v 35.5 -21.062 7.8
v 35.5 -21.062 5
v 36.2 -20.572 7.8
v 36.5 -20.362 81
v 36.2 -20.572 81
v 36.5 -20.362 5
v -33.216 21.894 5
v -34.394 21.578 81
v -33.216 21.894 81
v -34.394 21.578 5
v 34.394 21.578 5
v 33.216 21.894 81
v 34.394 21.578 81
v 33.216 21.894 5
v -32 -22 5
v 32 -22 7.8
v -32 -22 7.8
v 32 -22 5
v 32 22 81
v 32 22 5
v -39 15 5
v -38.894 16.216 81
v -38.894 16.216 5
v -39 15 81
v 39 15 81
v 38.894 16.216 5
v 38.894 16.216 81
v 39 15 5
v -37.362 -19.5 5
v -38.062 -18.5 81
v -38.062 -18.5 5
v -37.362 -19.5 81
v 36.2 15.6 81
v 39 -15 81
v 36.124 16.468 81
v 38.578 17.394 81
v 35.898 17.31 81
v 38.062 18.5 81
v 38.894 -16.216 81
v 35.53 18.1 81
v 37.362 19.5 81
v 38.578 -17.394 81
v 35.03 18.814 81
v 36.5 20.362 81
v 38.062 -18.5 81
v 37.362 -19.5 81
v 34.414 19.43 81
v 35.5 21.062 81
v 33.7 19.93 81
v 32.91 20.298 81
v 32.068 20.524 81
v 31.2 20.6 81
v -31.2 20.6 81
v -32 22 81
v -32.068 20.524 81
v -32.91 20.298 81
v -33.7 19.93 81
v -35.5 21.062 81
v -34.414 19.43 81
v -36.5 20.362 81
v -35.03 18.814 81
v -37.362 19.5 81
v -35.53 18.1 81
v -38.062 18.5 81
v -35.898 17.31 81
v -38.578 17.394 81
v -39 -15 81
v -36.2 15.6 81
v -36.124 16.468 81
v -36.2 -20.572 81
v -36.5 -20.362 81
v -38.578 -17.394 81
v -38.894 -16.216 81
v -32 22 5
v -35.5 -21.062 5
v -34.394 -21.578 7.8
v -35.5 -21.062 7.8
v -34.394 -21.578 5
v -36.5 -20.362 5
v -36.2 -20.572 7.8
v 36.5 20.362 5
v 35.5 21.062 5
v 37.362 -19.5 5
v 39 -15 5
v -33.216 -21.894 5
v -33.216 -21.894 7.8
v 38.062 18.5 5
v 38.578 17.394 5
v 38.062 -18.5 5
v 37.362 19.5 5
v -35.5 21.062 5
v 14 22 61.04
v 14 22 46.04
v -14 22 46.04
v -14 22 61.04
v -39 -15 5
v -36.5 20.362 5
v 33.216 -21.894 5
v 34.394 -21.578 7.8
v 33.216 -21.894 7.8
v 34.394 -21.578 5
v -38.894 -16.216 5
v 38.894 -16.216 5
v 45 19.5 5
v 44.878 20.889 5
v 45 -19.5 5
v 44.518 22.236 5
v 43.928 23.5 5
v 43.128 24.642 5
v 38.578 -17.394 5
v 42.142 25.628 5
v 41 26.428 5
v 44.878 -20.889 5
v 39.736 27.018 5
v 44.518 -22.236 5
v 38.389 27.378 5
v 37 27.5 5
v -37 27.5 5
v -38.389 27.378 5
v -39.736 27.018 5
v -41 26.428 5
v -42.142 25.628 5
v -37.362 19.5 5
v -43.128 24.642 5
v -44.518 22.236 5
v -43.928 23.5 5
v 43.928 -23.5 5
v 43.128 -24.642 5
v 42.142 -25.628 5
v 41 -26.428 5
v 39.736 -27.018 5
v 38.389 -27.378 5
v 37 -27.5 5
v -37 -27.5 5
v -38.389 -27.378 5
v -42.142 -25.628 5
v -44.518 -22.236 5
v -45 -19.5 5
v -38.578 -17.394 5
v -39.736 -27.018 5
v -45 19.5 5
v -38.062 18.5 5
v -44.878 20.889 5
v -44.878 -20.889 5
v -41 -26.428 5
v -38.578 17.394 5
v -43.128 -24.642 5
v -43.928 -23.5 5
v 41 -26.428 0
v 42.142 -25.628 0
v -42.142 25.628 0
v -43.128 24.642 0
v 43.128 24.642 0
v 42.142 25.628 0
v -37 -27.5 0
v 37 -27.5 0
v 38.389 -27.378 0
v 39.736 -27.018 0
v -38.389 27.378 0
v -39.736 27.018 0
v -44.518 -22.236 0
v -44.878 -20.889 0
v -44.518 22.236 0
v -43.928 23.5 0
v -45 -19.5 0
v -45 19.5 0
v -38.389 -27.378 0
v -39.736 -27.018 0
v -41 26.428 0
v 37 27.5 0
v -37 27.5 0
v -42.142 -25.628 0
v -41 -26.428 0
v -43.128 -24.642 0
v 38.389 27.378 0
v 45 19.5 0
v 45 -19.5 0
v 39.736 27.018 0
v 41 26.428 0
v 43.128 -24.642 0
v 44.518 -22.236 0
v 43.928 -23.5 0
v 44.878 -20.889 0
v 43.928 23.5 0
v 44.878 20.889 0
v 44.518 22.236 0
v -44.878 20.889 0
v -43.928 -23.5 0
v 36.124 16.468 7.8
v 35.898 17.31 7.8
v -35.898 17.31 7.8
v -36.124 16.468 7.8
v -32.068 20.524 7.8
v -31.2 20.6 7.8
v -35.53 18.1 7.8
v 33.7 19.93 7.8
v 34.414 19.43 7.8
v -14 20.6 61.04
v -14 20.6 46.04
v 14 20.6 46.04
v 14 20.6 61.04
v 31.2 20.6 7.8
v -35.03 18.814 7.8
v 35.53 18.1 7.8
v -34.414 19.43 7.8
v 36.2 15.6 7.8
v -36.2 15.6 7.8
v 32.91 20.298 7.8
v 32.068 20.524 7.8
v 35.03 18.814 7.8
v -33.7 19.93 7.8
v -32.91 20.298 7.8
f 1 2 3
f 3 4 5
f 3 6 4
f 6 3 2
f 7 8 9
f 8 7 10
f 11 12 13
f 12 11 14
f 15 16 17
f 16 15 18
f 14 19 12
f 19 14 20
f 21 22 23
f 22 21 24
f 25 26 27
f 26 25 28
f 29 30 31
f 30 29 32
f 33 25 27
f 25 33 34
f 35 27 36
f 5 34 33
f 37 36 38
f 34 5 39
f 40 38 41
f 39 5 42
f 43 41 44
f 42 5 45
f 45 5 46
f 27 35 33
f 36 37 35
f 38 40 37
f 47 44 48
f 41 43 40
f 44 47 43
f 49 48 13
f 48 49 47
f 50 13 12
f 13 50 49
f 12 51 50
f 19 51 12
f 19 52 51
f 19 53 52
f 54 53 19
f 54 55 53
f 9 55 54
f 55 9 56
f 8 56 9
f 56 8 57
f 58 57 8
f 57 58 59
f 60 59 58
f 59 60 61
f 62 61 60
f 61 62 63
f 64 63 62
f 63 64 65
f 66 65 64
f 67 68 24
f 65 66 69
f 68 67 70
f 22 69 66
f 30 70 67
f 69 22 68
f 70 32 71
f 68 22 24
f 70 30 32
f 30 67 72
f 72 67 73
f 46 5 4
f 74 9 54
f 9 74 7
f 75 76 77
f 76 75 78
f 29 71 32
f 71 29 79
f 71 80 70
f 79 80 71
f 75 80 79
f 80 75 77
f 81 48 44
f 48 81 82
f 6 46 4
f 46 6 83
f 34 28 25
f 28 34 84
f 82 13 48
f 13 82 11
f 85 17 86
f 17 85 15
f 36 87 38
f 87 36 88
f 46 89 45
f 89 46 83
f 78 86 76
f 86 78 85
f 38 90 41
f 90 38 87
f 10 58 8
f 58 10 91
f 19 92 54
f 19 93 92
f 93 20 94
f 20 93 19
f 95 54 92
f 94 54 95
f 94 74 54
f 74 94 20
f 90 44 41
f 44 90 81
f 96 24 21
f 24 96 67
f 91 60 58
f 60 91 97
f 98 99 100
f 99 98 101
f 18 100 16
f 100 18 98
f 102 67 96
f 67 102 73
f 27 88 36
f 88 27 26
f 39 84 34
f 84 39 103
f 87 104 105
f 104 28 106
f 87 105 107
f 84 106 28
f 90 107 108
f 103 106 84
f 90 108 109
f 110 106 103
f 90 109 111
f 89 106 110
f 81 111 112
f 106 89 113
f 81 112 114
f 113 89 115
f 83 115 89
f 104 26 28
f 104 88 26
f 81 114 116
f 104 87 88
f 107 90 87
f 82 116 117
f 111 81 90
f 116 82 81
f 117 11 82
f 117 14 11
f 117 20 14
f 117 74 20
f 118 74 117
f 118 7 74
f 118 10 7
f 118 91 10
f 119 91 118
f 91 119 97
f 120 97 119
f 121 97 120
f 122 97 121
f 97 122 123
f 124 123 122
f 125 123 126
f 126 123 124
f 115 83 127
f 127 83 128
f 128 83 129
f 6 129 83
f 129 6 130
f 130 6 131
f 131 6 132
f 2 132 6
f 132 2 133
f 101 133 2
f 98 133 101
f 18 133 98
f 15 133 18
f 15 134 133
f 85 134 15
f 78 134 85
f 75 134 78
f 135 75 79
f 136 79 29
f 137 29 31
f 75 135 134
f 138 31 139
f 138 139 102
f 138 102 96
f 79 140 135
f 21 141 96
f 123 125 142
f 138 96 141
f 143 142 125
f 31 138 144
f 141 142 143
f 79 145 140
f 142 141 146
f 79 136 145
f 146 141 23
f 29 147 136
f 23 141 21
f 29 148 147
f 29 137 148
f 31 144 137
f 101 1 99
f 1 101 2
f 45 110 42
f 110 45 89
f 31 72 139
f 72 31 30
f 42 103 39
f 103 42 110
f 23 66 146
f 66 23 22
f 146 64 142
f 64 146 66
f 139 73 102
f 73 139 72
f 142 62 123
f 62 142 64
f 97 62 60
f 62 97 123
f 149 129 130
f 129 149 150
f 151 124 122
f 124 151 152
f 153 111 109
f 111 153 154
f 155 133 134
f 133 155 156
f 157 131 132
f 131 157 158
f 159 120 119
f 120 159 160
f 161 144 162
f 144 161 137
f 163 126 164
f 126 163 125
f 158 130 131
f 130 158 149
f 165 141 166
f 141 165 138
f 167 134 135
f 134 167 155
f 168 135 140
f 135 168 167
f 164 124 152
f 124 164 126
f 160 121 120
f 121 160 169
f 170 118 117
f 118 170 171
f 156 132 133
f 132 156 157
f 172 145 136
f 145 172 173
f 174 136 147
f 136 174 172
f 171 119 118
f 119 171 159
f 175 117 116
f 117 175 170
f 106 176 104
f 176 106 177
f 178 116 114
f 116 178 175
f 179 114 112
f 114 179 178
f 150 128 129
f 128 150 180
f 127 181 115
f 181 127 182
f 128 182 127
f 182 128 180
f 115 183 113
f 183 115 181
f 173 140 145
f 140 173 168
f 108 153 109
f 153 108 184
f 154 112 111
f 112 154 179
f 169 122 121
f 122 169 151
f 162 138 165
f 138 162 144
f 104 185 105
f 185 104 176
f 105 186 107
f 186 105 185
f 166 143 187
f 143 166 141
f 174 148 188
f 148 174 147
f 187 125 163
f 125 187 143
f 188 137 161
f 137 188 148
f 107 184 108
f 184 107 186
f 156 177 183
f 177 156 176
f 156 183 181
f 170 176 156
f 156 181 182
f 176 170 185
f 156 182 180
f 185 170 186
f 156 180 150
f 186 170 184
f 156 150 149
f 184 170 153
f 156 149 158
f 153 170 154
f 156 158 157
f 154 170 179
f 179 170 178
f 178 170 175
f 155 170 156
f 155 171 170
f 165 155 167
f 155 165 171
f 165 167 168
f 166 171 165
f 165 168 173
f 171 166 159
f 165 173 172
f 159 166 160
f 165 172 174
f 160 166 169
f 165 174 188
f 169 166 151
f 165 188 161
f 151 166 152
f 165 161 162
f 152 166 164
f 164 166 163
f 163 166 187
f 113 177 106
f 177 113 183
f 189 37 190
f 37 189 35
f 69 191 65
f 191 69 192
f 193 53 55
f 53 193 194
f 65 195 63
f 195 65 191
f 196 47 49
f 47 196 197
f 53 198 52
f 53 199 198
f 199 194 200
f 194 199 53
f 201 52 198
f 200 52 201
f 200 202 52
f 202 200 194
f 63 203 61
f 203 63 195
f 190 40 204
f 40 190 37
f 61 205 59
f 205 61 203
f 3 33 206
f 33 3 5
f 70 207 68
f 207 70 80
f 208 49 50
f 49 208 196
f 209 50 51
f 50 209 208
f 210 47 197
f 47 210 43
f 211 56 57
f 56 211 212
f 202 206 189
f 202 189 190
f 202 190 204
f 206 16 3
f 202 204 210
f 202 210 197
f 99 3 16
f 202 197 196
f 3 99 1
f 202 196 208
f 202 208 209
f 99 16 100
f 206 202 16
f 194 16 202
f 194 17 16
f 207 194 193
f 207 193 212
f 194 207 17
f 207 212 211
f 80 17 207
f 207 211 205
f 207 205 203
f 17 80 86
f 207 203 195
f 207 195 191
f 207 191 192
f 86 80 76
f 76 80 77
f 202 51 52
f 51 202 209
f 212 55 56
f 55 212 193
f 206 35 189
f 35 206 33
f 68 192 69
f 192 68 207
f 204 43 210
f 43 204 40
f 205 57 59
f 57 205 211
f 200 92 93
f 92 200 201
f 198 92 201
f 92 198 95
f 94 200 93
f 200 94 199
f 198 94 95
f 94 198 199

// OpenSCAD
// Original adjustable desk companion enclosure (millimeters).
// Measurements below are illustrative; measure actual components before printing.
// Open back allows service, USB and initial foam-tape mounting.
$fn = 36;
body_w = 78;
body_h = 76;
body_d = 44;
wall = 2.8;
screen_w = 28;  // visible window width: revise for purchased OLED
screen_h = 15;  // visible window height: revise for purchased OLED
base_w = 90;
base_d = 55;
base_h = 5;

module rounded_box(w,d,h,r=5) {
  hull() for(x=[-w/2+r,w/2-r],y=[-d/2+r,d/2-r])
    translate([x,y,0]) cylinder(r=r,h=h);
}
module shell() {
  difference() {
    union() {
      translate([0,0,base_h]) rounded_box(body_w,body_d,body_h,7);
      rounded_box(base_w,base_d,base_h,8);
    }
    // cavity opens at rear (negative Y), leaving front wall
    translate([0,-wall,base_h+wall])
      rounded_box(body_w-2*wall,body_d+wall,body_h,5);
    // display window on front face (+Y), at eye level
    translate([-screen_w/2,body_d/2-wall-1,base_h+body_h*0.54])
      cube([screen_w,wall+3,screen_h]);
    // USB/service exit in the bottom rear (size to be measured)
    translate([-7,-base_d/2-1,base_h+8])
      cube([14,wall+10,10]);
  }
}
shell();
